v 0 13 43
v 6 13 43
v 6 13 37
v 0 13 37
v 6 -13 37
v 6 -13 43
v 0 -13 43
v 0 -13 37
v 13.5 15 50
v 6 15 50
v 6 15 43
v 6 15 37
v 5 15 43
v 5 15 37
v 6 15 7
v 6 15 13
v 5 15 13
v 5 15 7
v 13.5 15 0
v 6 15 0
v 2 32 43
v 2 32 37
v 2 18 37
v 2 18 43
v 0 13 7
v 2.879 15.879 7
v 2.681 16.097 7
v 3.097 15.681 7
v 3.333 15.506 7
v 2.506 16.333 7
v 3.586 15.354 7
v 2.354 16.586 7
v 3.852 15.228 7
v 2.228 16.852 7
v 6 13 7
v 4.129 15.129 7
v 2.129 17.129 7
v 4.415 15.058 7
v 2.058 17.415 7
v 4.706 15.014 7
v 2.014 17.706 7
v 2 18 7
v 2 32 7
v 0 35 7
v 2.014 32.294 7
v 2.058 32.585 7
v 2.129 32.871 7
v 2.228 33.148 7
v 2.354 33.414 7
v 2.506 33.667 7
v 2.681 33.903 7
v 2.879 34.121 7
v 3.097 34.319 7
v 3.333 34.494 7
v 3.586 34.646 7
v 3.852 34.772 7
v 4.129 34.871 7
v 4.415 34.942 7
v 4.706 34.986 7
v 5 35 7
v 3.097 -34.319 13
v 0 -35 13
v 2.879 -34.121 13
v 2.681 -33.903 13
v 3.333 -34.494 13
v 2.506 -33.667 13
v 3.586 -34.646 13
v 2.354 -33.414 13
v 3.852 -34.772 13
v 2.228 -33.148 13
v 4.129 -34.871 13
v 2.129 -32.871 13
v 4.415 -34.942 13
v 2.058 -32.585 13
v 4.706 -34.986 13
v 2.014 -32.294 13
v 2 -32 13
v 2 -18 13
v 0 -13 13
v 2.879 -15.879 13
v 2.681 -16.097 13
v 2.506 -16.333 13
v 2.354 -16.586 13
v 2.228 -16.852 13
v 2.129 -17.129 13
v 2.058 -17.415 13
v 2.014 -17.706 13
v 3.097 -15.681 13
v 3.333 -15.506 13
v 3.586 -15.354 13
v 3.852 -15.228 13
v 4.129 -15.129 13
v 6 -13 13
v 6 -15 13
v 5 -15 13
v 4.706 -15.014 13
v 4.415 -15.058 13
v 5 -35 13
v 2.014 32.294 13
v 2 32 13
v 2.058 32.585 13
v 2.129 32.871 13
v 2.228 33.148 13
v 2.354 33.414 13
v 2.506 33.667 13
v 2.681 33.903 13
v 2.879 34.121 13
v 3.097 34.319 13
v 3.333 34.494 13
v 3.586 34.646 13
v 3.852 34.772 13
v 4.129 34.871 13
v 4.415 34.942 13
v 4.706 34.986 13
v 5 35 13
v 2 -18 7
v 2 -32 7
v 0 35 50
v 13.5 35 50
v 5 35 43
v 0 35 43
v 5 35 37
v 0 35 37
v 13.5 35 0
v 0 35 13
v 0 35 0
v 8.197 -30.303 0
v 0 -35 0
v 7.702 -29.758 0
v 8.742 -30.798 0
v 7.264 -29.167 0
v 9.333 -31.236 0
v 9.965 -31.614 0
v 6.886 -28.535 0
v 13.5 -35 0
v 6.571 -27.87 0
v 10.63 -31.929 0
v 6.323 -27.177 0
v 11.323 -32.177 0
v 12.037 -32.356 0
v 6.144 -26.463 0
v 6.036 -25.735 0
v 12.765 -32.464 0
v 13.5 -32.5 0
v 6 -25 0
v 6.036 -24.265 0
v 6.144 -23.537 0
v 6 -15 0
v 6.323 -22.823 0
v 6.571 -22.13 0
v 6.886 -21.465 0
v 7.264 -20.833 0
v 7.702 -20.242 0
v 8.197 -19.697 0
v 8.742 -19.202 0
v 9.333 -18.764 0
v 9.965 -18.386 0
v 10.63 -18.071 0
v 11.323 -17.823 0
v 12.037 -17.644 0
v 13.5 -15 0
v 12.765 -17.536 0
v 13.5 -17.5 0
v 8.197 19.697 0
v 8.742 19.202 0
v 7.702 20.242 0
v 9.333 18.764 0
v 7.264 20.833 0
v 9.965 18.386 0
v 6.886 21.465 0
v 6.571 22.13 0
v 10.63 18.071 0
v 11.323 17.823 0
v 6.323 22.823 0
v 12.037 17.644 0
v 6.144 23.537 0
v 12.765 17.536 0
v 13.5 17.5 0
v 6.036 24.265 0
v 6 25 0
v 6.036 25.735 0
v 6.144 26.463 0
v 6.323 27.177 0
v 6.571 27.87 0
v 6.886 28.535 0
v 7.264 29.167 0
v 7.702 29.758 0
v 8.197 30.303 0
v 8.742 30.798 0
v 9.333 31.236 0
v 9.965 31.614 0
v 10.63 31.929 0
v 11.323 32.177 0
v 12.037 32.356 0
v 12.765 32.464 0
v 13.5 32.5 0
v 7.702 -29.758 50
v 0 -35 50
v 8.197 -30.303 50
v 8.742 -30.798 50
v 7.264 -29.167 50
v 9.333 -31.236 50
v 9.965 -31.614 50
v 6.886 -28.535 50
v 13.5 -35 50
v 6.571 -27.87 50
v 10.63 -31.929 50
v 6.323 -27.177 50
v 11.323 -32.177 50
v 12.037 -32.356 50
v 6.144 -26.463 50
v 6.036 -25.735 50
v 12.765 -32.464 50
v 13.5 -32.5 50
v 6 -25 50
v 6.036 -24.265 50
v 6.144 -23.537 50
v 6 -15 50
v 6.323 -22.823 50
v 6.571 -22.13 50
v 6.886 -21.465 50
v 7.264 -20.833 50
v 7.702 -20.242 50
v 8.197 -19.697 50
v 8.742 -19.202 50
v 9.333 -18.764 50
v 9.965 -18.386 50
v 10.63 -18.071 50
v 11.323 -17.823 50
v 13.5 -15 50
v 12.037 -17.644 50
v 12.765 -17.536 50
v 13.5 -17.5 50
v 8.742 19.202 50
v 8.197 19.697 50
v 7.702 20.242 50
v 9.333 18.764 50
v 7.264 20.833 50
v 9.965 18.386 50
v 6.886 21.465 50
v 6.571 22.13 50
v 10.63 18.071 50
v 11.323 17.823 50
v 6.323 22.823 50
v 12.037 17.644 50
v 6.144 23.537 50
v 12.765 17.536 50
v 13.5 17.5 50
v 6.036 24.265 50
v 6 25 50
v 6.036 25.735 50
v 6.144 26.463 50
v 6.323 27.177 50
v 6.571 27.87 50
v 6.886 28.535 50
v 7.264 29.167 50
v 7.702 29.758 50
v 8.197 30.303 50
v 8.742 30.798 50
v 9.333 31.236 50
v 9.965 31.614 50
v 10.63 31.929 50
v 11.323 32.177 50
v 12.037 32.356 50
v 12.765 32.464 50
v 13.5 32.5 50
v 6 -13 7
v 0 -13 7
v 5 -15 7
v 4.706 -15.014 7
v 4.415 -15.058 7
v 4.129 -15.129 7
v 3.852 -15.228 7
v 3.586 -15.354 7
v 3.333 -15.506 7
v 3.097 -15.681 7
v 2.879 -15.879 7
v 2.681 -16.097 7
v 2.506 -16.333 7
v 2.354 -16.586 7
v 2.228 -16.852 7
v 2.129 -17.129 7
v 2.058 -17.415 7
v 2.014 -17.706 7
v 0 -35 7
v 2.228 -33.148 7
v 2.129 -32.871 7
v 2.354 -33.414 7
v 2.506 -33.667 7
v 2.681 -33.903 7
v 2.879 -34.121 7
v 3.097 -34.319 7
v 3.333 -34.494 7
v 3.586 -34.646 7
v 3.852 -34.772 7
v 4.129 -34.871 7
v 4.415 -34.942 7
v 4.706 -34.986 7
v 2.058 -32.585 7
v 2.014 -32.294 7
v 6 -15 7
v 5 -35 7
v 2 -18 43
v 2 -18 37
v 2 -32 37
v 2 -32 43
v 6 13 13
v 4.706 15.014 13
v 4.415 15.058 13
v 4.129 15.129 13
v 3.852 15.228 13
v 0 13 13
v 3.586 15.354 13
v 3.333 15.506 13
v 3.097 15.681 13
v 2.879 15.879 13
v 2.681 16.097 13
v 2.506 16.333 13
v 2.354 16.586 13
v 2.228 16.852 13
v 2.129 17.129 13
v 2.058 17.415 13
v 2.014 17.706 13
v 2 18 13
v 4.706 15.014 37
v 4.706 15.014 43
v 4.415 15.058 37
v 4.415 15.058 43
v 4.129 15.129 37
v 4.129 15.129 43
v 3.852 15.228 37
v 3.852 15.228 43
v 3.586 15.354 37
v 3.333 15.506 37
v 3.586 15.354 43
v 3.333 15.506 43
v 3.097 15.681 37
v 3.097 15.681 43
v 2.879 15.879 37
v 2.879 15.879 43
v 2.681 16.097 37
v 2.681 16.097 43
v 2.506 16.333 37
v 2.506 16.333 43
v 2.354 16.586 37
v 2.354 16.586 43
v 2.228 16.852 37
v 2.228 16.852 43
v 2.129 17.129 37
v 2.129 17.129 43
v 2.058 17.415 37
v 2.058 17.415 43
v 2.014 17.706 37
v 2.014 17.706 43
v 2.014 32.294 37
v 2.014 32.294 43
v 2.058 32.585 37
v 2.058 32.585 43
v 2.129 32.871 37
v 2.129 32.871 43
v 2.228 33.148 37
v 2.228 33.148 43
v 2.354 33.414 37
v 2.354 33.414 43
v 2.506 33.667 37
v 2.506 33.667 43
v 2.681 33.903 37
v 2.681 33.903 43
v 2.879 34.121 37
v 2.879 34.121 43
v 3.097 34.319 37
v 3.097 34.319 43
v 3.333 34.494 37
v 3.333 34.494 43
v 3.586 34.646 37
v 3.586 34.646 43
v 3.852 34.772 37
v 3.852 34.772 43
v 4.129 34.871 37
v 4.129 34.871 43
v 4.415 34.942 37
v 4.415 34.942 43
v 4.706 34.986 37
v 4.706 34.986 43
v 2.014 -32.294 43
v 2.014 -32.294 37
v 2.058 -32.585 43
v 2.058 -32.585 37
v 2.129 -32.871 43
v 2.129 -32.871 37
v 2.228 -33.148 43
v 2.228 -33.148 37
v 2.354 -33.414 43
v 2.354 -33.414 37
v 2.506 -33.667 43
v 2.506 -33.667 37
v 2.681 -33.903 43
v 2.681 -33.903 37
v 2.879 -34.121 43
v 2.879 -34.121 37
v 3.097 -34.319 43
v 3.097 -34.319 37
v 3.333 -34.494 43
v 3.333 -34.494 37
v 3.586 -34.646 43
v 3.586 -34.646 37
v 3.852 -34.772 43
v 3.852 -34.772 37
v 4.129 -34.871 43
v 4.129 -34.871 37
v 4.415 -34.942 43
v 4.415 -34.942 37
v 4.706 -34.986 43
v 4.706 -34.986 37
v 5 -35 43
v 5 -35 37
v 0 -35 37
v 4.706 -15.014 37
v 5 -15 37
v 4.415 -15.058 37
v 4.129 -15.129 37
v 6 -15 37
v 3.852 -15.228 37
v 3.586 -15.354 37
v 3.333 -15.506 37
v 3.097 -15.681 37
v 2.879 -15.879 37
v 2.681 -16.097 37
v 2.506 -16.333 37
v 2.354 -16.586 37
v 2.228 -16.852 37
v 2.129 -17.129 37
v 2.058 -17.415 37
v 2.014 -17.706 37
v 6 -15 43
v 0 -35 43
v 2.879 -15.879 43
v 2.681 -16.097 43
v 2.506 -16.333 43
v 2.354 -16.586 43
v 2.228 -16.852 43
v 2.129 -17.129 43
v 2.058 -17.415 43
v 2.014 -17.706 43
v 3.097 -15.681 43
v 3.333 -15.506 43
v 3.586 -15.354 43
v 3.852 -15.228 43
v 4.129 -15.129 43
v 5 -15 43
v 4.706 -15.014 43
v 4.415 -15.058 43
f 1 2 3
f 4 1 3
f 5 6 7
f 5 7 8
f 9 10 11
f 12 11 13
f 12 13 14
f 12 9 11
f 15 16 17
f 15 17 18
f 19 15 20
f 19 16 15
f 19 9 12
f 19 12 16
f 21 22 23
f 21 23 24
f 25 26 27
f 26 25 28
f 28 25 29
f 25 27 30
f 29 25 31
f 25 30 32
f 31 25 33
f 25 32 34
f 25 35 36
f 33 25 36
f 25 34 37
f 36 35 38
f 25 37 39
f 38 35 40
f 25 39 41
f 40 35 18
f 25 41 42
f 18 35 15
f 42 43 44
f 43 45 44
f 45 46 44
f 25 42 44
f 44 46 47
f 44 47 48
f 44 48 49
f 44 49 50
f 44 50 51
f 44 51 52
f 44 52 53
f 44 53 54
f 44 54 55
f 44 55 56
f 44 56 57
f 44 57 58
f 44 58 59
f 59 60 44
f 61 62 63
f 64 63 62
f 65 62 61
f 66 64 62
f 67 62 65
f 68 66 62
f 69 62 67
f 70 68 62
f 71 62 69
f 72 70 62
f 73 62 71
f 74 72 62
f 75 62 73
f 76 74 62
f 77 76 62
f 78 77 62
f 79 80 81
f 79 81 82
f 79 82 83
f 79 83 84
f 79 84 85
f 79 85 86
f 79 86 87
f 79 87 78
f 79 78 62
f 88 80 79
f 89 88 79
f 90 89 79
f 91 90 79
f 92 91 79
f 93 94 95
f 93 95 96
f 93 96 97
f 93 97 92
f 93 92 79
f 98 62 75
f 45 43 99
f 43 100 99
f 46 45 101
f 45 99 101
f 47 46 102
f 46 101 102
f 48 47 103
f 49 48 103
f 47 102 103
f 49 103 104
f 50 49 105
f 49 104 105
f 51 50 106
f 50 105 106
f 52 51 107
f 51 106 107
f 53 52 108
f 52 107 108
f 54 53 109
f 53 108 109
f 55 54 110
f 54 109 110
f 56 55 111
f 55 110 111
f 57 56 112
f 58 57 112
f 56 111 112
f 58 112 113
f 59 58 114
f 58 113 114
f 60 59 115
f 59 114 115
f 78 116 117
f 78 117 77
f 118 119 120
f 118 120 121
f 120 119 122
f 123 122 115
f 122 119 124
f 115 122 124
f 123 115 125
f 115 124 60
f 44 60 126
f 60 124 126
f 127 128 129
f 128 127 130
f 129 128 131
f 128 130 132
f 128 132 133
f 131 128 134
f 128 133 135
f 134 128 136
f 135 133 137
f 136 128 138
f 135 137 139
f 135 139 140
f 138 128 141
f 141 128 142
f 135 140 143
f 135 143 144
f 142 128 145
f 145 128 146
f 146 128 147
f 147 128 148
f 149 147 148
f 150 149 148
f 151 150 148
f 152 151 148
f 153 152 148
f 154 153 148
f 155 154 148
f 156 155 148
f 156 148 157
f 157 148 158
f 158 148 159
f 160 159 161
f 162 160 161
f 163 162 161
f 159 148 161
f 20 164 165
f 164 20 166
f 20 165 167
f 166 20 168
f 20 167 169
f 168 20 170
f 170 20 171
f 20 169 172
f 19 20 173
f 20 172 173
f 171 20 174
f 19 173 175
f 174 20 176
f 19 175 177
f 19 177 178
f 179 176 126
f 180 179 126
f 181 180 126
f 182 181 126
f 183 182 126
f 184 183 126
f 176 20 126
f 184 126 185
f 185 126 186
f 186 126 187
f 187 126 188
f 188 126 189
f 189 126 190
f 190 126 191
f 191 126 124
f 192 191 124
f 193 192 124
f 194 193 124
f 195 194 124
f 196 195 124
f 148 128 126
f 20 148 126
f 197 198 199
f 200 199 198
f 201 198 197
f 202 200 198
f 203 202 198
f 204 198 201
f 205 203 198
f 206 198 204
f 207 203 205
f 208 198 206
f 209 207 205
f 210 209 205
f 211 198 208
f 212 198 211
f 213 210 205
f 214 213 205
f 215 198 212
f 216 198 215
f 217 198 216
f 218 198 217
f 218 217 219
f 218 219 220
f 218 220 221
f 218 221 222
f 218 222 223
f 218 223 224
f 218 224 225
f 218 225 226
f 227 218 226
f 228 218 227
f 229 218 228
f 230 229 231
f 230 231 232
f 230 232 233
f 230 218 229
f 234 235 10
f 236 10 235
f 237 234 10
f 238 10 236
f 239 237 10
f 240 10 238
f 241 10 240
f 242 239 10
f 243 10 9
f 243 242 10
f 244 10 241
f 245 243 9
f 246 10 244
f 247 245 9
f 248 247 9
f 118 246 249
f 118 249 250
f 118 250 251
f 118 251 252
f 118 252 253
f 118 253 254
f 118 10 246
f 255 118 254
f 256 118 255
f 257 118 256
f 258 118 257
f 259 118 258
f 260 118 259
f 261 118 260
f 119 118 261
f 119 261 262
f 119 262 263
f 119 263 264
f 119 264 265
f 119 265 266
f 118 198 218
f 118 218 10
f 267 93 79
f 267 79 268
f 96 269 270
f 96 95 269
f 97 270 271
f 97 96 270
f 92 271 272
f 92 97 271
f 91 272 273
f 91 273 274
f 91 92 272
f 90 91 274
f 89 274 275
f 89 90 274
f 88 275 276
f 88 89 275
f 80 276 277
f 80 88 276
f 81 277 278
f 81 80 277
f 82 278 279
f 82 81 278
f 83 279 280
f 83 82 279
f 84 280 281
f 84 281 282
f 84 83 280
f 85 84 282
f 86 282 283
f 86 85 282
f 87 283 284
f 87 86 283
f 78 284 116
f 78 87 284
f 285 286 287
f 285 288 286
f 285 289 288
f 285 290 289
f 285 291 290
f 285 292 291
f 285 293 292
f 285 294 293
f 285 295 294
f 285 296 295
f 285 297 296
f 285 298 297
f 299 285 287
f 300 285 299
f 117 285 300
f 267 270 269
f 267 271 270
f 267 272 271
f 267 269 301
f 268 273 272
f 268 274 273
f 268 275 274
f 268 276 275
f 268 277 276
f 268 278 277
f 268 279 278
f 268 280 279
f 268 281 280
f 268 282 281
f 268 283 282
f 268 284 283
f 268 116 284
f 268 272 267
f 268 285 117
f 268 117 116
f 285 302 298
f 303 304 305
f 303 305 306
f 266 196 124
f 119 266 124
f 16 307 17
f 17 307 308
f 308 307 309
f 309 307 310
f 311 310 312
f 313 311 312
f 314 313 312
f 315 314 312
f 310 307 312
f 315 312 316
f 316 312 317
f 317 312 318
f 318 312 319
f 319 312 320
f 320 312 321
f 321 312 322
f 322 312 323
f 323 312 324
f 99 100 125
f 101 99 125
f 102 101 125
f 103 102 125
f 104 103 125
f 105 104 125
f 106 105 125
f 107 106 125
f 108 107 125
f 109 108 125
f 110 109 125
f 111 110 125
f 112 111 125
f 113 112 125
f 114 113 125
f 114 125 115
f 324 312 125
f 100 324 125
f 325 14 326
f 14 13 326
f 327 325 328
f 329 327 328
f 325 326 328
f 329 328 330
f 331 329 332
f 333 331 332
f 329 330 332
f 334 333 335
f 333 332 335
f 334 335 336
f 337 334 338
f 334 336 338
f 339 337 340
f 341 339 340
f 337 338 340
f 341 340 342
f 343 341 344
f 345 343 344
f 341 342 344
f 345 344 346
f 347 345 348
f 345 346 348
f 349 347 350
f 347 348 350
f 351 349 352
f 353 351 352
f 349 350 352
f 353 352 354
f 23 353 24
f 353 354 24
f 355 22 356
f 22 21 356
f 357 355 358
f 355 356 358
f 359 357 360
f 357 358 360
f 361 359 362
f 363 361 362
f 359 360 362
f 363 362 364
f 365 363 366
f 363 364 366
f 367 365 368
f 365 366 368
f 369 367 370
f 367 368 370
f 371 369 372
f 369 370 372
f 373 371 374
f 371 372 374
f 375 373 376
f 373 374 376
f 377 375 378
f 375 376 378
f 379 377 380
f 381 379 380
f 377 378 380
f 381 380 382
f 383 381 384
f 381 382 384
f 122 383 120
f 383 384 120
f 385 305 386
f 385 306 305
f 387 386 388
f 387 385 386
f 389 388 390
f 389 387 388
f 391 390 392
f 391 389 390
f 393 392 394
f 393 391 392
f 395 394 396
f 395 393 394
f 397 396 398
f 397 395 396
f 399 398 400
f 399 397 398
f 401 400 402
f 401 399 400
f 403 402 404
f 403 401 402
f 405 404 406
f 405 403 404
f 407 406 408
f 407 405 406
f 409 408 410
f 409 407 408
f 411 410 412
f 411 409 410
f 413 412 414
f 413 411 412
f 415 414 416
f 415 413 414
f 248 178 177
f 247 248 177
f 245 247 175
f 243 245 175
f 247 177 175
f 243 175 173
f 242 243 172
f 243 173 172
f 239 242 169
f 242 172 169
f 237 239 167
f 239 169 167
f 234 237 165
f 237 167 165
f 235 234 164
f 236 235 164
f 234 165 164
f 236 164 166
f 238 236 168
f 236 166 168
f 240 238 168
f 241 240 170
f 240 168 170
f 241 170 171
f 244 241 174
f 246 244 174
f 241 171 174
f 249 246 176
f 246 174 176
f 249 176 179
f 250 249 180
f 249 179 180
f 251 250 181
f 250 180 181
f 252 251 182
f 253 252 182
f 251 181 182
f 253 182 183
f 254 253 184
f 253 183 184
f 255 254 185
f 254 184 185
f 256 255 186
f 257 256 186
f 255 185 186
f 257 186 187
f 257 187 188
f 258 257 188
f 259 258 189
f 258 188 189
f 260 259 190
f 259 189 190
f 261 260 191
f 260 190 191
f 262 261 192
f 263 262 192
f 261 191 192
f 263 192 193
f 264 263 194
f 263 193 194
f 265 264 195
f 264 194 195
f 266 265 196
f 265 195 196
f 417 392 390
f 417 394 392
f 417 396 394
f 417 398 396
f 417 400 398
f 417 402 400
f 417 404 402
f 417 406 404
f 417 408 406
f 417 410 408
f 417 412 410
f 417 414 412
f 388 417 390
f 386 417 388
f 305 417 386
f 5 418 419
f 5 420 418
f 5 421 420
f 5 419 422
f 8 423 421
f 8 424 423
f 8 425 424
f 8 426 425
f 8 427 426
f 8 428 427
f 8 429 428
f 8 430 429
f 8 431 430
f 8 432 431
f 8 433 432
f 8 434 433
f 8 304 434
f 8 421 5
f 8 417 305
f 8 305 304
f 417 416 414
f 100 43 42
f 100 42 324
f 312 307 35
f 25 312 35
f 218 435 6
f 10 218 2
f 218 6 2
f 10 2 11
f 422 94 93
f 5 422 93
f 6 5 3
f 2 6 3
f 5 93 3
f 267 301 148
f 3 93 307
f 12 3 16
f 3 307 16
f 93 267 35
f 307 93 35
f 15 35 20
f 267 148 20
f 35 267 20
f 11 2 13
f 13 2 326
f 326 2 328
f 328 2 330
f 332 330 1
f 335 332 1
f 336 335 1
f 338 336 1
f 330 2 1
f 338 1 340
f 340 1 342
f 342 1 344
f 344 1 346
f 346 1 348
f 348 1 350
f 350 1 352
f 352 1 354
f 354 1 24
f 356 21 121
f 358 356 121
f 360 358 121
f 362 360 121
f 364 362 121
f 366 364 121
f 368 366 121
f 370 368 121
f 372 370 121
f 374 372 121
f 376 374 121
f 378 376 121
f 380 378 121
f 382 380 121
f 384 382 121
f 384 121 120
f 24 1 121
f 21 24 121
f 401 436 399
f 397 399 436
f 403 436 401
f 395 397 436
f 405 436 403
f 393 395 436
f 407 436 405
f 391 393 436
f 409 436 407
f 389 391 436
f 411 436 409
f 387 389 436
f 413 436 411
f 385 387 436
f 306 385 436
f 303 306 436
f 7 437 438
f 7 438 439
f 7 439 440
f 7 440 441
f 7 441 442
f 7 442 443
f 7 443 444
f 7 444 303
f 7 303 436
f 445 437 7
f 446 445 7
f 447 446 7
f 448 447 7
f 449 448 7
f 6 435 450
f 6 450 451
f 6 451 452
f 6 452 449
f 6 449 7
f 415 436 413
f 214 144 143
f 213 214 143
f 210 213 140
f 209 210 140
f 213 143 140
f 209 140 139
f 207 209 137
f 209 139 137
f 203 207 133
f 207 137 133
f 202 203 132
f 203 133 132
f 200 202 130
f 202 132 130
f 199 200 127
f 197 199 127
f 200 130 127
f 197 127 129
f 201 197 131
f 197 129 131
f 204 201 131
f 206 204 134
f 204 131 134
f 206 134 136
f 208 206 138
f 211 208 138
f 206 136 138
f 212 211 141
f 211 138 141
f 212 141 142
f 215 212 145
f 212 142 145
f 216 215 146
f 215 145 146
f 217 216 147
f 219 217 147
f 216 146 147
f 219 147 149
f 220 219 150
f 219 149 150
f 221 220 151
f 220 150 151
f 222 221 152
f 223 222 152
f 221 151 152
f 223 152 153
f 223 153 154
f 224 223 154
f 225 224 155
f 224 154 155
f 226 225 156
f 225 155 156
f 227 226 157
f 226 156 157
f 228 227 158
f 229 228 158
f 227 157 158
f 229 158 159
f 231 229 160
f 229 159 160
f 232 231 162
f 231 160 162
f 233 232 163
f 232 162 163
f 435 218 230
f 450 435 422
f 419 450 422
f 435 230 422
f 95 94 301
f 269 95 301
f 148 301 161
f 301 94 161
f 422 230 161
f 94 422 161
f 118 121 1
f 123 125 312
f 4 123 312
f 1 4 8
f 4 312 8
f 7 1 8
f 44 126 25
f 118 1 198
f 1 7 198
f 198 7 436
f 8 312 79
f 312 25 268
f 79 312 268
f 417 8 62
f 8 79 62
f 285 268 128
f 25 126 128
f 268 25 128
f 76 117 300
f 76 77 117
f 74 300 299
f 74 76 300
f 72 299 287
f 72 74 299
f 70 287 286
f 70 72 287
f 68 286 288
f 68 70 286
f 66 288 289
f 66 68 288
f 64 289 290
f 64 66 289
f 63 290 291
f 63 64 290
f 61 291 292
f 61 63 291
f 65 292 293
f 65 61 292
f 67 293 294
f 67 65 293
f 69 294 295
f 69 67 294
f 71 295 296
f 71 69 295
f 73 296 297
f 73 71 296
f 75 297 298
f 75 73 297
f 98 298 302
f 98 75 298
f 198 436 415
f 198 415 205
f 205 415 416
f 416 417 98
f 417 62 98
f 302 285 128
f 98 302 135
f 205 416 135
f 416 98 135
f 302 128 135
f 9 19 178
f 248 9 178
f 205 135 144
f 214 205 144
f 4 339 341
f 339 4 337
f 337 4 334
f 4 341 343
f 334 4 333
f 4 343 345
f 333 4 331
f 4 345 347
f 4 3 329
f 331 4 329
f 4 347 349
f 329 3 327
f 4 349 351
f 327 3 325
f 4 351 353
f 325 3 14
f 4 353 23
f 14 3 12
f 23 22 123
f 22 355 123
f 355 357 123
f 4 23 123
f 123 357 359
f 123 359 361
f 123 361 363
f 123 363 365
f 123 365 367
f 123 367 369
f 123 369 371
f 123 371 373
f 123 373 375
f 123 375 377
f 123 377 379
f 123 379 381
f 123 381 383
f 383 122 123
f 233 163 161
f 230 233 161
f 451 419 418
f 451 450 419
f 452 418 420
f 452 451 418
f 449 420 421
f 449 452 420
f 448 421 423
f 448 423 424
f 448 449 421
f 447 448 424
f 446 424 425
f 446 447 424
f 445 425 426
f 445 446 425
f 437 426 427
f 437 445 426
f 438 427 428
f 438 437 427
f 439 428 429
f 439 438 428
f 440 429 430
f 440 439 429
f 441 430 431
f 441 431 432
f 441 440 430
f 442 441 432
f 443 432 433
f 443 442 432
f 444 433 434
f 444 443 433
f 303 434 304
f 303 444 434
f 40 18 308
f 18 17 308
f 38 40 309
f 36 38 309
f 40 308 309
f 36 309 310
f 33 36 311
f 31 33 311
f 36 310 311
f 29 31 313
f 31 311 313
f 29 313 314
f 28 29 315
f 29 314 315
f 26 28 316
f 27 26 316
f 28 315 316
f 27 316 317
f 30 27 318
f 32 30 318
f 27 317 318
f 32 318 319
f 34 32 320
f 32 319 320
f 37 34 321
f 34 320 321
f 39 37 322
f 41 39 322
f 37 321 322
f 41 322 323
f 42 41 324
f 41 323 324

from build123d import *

# Parameters (mm, degrees)
RESSALTO_EXTRUS_O1_DEPTH = 50
ESBO_O2_W                = 6
ESBO_O2_H                = 2
CORTE_EXTRUS_O1_DEPTH    = 10
ESBO_O3_W                = 6
ESBO_O3_H                = 20
CORTE_EXTRUS_O2_DEPTH    = 2
FILETE1_R                = 3


with BuildPart() as part:
    # Esboço1 → Ressalto-extrusão1 (new body)
    with BuildSketch(Plane.XY):
        with BuildLine():
            Line((0, 35), (0, -35))
            Line((0, -35), (13.5, -35))
            Line((13.5, -35), (13.5, -32.5))
            ThreePointArc((13.5, -32.5), (6, -25), (13.5, -17.5))
            Line((13.5, -17.5), (13.5, -15))
            Line((13.5, -15), (6, -15))
            Line((6, -15), (6, 15))
            Line((6, 15), (13.5, 15))
            Line((13.5, 15), (13.5, 17.5))
            ThreePointArc((13.5, 17.5), (6, 25), (13.5, 32.5))
            Line((13.5, 32.5), (13.5, 35))
            Line((13.5, 35), (0, 35))
        make_face()
    extrude(amount=RESSALTO_EXTRUS_O1_DEPTH)

    # Esboço2 → Corte-extrusão1 (cut)
    with BuildSketch(Plane(origin=(6, 0, 0), x_dir=(0, 0, -1), z_dir=(1, 0, 0))):
        with Locations((-10, 14)):
            Rectangle(ESBO_O2_W, ESBO_O2_H)
        with Locations((-40, 14)):
            Rectangle(ESBO_O2_W, ESBO_O2_H)
        with Locations((-40, -14)):
            Rectangle(ESBO_O2_W, ESBO_O2_H)
        with Locations((-10, -14)):
            Rectangle(ESBO_O2_W, ESBO_O2_H)
    extrude(amount=-CORTE_EXTRUS_O1_DEPTH, mode=Mode.SUBTRACT)

    # Esboço3 → Corte-extrusão2 (cut)
    with BuildSketch(Plane.ZY):
        with Locations((10, 25)):
            Rectangle(ESBO_O3_W, ESBO_O3_H)
        with Locations((40, 25)):
            Rectangle(ESBO_O3_W, ESBO_O3_H)
        with Locations((40, -25)):
            Rectangle(ESBO_O3_W, ESBO_O3_H)
        with Locations((10, -25)):
            Rectangle(ESBO_O3_W, ESBO_O3_H)
    extrude(amount=-CORTE_EXTRUS_O2_DEPTH, mode=Mode.SUBTRACT)

    # Filete1
    filete1_edges = [part.edges().sort_by_distance(p)[0] for p in [
        (2, 15, 10),
        (2, 35, 10),
        (2, 15, 40),
        (2, 35, 40),
        (2, -15, 40),
        (2, -35, 40),
        (2, -15, 10),
        (2, -35, 10),
    ]]
    fillet(filete1_edges, radius=FILETE1_R)


solid = part.part
